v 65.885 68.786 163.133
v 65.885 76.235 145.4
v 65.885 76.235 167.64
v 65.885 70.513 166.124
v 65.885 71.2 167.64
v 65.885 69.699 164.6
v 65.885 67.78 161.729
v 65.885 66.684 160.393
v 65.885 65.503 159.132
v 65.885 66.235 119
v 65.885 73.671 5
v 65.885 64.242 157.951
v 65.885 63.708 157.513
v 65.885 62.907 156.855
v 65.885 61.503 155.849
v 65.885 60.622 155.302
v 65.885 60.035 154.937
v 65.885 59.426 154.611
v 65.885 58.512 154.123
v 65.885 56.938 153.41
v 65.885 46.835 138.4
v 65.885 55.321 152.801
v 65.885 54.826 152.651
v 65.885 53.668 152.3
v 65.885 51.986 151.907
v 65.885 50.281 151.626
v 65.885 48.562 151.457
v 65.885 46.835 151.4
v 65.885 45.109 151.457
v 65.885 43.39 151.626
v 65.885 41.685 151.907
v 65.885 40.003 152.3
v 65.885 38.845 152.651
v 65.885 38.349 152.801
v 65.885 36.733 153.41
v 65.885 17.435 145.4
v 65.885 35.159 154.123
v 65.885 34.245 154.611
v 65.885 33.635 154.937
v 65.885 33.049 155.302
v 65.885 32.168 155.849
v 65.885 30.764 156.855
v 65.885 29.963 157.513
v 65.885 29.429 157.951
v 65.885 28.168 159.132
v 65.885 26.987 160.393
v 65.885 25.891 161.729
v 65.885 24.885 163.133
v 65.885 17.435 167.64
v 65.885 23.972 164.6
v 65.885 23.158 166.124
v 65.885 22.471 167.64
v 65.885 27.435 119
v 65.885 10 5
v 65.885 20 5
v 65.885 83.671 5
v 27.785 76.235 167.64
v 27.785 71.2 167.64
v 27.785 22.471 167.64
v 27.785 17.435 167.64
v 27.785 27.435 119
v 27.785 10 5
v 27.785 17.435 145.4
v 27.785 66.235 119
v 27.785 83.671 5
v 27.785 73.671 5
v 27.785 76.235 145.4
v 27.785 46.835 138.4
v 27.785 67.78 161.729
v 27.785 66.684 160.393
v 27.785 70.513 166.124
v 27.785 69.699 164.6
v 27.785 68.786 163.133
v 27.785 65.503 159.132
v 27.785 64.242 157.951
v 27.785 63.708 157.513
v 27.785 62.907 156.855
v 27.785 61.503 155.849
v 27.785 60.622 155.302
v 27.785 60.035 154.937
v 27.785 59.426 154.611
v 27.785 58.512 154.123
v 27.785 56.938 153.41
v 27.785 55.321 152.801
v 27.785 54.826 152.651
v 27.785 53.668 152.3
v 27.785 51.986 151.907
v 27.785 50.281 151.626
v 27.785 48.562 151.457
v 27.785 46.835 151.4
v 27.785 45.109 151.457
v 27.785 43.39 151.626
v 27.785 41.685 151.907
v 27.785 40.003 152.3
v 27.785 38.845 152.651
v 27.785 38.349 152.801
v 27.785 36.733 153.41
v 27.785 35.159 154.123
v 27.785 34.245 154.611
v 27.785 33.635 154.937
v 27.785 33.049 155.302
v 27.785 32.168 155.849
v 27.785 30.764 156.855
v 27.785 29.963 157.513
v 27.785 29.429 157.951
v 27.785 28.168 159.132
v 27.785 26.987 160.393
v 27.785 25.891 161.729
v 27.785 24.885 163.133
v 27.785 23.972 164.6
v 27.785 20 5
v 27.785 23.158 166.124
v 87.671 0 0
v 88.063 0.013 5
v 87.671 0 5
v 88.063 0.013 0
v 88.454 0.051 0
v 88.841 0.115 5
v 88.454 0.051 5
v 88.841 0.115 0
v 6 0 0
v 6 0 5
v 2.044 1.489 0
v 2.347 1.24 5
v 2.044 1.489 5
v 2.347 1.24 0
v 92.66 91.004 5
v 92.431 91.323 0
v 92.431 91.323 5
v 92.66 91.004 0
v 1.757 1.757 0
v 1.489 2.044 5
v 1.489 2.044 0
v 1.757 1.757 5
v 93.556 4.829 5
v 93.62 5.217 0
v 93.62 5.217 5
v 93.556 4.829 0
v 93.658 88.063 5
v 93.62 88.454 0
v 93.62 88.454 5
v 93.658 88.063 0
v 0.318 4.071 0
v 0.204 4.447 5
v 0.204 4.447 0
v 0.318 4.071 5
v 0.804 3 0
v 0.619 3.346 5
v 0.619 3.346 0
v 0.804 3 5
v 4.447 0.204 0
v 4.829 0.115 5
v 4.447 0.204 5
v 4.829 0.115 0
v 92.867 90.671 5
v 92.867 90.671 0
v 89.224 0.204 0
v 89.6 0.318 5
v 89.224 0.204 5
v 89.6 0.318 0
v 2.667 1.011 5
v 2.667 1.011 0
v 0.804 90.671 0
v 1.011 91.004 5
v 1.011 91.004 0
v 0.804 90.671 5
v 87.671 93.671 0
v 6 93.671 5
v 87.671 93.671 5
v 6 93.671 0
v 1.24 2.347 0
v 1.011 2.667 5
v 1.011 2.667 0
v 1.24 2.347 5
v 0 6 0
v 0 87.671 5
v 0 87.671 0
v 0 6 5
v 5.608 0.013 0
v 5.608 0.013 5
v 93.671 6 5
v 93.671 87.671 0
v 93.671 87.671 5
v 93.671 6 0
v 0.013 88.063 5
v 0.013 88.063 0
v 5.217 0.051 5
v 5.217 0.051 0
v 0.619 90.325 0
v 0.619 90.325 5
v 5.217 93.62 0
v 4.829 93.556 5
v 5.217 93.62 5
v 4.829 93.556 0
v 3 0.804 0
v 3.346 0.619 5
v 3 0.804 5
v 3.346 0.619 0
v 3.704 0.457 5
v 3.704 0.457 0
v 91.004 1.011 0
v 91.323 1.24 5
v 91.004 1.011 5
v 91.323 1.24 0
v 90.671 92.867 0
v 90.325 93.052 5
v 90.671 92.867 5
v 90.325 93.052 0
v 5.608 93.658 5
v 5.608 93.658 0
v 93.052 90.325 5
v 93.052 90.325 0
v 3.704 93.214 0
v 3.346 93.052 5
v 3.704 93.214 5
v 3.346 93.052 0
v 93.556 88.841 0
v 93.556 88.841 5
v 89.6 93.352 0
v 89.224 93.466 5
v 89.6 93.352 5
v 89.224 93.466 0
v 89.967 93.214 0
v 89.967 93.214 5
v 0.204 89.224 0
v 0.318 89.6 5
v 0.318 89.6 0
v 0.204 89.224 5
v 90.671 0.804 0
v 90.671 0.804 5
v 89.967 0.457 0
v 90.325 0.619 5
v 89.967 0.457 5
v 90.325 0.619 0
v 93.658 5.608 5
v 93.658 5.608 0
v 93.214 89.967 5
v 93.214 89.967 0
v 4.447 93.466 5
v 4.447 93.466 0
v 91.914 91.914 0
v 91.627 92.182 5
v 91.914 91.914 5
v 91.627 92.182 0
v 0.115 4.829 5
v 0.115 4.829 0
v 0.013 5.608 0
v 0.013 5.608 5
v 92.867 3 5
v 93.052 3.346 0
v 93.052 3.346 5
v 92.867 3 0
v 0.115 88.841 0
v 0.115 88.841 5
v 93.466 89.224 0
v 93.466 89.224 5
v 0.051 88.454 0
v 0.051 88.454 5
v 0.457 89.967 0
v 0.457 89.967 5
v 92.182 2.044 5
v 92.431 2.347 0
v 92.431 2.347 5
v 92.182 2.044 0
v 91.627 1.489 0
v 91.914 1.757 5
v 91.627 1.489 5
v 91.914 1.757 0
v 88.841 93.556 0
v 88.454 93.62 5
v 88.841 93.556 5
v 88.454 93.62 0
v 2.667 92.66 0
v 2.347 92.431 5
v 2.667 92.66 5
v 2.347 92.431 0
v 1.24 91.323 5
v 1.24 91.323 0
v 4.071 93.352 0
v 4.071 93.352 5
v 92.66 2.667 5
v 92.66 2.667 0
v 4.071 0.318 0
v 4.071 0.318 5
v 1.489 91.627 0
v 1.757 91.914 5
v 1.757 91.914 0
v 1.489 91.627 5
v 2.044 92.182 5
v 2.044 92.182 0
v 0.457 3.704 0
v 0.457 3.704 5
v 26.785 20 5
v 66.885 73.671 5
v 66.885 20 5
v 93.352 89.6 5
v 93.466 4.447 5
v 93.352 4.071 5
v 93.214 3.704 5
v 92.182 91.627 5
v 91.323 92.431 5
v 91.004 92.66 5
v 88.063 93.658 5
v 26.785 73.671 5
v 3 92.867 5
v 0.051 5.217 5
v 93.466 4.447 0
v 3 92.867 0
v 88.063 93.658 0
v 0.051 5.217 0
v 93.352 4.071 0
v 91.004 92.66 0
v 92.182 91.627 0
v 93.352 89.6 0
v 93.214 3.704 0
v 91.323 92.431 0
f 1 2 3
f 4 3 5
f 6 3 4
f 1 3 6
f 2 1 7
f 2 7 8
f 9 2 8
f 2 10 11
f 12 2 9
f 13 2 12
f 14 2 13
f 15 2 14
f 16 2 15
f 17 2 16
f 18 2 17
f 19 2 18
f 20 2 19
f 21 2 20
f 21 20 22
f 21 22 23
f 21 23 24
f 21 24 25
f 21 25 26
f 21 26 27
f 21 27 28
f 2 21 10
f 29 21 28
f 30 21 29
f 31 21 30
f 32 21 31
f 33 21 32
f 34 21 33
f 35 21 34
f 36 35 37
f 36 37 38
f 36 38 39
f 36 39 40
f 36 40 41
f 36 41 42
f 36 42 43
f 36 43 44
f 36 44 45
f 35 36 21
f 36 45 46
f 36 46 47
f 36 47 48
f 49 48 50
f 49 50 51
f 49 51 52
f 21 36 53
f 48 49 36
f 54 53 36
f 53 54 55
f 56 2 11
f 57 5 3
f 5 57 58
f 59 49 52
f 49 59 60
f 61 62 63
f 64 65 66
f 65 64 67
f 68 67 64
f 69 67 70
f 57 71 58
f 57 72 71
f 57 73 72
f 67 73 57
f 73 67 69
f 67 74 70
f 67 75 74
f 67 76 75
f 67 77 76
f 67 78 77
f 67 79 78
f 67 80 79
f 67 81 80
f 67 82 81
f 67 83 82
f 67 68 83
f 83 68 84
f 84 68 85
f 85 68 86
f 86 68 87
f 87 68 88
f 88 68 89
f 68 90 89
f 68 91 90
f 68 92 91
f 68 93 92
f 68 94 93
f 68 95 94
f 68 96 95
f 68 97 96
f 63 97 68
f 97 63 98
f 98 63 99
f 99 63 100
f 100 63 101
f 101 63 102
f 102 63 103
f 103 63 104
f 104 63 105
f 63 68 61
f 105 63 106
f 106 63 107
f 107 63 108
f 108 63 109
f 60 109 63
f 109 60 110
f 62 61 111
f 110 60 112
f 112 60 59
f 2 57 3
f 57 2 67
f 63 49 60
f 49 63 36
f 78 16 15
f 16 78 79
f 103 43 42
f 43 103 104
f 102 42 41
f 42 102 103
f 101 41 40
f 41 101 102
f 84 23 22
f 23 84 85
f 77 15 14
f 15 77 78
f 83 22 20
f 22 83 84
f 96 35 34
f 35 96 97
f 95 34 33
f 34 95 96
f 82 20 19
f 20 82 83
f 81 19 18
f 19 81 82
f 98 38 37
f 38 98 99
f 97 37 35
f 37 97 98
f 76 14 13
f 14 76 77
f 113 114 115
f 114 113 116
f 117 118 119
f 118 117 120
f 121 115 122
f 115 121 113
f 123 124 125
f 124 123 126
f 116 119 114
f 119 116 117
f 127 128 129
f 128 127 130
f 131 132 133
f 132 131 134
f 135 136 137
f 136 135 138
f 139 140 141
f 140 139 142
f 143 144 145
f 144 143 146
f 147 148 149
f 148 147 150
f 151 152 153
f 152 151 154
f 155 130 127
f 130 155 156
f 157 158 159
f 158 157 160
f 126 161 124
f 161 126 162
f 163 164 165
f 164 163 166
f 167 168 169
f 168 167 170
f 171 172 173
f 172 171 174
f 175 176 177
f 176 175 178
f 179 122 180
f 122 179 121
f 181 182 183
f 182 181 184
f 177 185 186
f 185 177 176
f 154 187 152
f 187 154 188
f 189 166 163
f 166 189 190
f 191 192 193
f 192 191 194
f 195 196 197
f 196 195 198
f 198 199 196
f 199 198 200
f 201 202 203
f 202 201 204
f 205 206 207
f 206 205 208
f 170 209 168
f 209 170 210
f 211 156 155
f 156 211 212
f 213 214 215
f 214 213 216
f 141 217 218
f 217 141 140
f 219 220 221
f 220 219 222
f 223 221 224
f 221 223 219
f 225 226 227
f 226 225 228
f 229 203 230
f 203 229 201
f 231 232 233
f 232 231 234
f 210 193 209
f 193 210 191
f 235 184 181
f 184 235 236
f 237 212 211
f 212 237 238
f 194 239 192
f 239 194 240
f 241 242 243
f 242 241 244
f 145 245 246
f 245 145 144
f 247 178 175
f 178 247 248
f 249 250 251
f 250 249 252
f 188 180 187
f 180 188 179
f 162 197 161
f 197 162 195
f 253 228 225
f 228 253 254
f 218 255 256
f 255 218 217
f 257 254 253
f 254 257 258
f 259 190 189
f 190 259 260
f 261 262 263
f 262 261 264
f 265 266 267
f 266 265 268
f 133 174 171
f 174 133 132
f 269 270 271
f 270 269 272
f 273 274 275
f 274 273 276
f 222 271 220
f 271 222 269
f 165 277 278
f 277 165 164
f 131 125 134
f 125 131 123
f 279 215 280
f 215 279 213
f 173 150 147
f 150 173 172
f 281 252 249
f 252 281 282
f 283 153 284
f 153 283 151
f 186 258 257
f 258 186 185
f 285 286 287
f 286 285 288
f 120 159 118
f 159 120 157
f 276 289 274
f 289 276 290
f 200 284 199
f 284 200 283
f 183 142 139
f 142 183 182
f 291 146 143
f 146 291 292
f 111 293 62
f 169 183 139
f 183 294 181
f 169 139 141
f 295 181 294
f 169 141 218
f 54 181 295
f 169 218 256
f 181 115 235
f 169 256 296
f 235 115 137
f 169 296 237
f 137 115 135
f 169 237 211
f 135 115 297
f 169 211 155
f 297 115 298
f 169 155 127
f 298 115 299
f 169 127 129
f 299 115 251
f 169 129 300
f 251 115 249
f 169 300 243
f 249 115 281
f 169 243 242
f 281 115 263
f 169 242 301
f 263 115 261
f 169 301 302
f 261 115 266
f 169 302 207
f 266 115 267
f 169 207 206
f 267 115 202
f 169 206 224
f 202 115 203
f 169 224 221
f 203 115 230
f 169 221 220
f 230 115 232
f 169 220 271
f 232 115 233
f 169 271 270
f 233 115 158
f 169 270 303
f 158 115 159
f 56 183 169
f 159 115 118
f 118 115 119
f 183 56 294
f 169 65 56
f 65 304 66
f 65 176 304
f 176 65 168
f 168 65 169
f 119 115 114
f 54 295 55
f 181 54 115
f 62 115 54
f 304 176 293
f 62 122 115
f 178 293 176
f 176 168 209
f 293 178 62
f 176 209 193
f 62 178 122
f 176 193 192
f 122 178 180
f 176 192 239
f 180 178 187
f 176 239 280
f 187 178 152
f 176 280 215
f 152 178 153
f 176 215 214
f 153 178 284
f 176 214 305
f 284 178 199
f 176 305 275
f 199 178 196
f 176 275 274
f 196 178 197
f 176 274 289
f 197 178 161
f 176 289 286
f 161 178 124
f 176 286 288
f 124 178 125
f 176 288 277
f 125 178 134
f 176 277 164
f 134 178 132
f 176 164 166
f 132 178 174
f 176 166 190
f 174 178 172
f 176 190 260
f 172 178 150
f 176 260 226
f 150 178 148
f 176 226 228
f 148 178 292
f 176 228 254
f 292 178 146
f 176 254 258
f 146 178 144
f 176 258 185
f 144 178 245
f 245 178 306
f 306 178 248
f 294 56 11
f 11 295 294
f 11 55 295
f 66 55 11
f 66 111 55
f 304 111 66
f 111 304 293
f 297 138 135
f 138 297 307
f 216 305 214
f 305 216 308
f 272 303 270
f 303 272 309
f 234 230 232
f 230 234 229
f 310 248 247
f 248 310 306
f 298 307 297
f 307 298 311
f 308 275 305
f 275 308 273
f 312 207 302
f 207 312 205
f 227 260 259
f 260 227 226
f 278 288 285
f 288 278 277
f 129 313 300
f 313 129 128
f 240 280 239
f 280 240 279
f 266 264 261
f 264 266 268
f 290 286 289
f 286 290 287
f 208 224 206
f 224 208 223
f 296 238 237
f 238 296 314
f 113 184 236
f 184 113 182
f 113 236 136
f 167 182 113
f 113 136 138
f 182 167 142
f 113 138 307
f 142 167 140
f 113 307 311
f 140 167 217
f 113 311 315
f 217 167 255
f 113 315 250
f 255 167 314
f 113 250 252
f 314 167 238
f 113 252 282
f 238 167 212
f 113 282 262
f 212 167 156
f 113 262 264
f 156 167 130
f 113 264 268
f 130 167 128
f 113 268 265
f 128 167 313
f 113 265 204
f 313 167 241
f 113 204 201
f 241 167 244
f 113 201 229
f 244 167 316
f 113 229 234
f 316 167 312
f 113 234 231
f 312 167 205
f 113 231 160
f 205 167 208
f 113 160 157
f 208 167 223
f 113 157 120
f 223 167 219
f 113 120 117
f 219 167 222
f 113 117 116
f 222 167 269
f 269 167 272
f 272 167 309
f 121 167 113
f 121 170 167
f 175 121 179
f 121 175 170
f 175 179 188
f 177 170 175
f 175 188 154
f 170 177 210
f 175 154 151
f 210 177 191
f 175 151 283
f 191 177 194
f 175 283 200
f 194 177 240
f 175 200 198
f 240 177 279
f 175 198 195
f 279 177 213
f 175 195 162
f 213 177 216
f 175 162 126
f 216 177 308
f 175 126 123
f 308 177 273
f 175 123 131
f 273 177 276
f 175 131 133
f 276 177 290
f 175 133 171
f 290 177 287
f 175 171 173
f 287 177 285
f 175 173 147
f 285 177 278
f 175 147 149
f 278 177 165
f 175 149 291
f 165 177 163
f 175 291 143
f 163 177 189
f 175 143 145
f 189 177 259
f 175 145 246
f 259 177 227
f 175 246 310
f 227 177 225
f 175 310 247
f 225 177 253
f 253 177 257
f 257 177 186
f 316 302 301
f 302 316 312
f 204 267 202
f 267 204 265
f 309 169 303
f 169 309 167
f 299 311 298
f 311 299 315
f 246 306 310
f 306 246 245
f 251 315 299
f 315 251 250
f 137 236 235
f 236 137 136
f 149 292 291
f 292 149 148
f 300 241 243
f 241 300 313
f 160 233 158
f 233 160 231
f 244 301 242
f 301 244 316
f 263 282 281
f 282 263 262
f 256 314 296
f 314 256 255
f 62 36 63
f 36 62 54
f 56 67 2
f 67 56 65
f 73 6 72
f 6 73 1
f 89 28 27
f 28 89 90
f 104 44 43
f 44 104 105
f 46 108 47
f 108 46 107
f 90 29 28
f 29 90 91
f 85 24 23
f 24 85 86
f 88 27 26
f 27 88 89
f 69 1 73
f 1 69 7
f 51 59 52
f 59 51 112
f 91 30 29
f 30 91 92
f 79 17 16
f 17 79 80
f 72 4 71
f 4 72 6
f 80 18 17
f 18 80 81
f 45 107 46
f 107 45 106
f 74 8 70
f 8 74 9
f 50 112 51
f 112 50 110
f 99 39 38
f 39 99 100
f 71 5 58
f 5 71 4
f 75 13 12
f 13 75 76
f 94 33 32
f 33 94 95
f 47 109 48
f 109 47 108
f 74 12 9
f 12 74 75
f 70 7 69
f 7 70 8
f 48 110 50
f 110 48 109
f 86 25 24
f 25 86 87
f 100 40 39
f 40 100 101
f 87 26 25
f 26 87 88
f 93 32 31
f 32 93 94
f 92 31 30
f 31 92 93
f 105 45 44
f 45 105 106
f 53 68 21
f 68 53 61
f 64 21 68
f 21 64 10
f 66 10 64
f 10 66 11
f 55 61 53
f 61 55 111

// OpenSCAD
// SPDX-License-Identifier: MIT
// Tilt prop: a stand that holds a sewing machine tipped back in its base
// Copyright (c) 2026 Robert Drzyzgula
// All dimensions in mm unless noted.
//
// A copy of this file is also kept in the Sewing Notions repository
// (github.com/bobdrzyzgula/Sewing-Notions), at tilt-prop/tilt_prop.scad.
// When either copy changes, ask Bob whether to make the same change in
// the other.
//
// Stand it on the table behind the base and tip the machine back onto it:
// its top catches the machine's arm (or some other solid part), so the
// machine stays put for oiling and adjusting, with both hands free, and its
// weight goes into the table instead of tipping the base up.
//
// The top is a cradle, for a round arm (a radius, and a width along the
// arm), or flat (a width and a length). Either can slope, to meet a part
// that comes to rest at an angle: the top turns about the width axis (the
// cradle's axis), rising toward the back. The foot is sized for stability:
// the line of a load on the top, square to it, can lean a further
// `stability_angle` either way before it passes the foot's edge, so a
// knock or a sloping top won't tip the prop over.
//
// Two tapered legs, front and back, rise from the foot to the top, with a
// gabled opening between them; it prints upright without supports.
// Self-contained: no libraries needed.
//
// Spun off from the VSM Base (https://github.com/bobdrzyzgula/VSM-Base).

/* [Top] */
// Height of the top above the table: the cradle's bottom, or the flat top's surface at its middle
height = 152.4; // [40 : 0.5 : 400]
// Top: a cradle for a round arm, or flat
top = "cradle"; // [cradle, flat]
// Cradle: radius (the arm's radius plus a little)
cradle_r = 25.4; // [5 : 0.5 : 80]
// Width along the arm (the cradle's length, or the flat top's width)
width = 38.1; // [15 : 0.5 : 150]
// Flat top: length, front to back
flat_length = 50; // [15 : 0.5 : 200]
// Slope of the top, degrees from level, rising toward the back (negative: toward the front)
slope = 0; // [-45 : 1 : 45]

/* [Foot and legs] */
// How far a load on the top may lean past square to it, either way, before the prop would tip (sets the foot's size)
stability_angle = 15; // [5 : 1 : 35]
// Foot thickness
foot_t = 5; // [3 : 0.5 : 12]
// Leg thickness, front and back
leg_t = 10; // [5 : 0.5 : 25]
// Clearance added to the cradle's radius
cradle_clear = 1; // [0 : 0.1 : 3]

/* [Hidden] */
$fn = 96;
// Head: depth front to back, its underside below the top, the cradle's lips
head_d  = top == "flat" ? flat_length : 2 * cradle_r + 8;
head_dz = 8;
lip_h   = top == "flat" ? 0 : 0.6 * cradle_r;
// Foot: the load's line from the top's middle, leaning up to slope +
// stability_angle (front and back) or stability_angle (sideways), must
// stay inside the foot, plus a margin
reach_y = height * tan(min(abs(slope) + stability_angle, 60));
reach_x = height * tan(stability_angle);
foot_y  = max(head_d + 20, 2 * (reach_y + 6));
foot_x  = max(width + 20, 2 * (reach_x + 6));
head_cy = 0;                                  // the top's middle, over the foot's centre

echo(str("Tilt prop: ", top == "flat" ? str("flat top ", width, " x ", flat_length, " mm")
                                      : str("cradle ", cradle_r, " mm radius, ", width, " mm wide"),
         ", ", height, " mm high", slope != 0 ? str(", sloping ", slope, " degrees") : "",
         "; foot ", round(foot_x), " x ", round(foot_y), " mm"));

// The head in its own frame: the top's middle at the origin, level
module head() {
    difference() {
        translate([-width / 2, -head_d / 2, -head_dz]) cube([width, head_d, head_dz + lip_h]);
        if (top == "cradle")
            translate([-width / 2 - 1, 0, cradle_r]) rotate([0, 90, 0])
                cylinder(h = width + 2, r = cradle_r + cradle_clear);
    }
}
// Placed: up to the height, turned by the slope about the width axis
module placed() {
    translate([0, head_cy, height]) rotate([slope, 0, 0]) children();
}

module tilt_prop() {
    difference() {
        union() {
            // foot, corners rounded
            linear_extrude(height = foot_t)
                offset(r = 6) offset(delta = -6) square([foot_x, foot_y], center = true);
            // legs: a post tapering from the foot to the head's underside
            hull() {
                translate([-width / 2, -(foot_y - 20) / 2, 0]) cube([width, foot_y - 20, foot_t]);
                placed() translate([-width / 2, -head_d / 2, -head_dz]) cube([width, head_d, 1]);
            }
            placed() head();
        }
        // the cradle again, through the post's top where the slope tips it
        if (top == "cradle")
            placed() translate([-width / 2 - 1, 0, cradle_r]) rotate([0, 90, 0])
                cylinder(h = width + 2, r = cradle_r + cradle_clear);
        // the opening between the legs, gabled so it prints without a bridge
        let(yb = (foot_y - 20) / 2 - leg_t,
            yt = head_d / 2 - leg_t,
            zt = height - head_dz - abs(sin(slope)) * head_d / 2 - 6 - yt)
            if (yt > 2 && zt > foot_t + 10)
                rotate([90, 0, 90]) linear_extrude(height = width + 2, center = true)
                    polygon([[-yb, foot_t], [yb, foot_t], [yt, zt], [0, zt + yt], [-yt, zt]]);
    }
}

translate([foot_x / 2, foot_y / 2, 0]) tilt_prop();
